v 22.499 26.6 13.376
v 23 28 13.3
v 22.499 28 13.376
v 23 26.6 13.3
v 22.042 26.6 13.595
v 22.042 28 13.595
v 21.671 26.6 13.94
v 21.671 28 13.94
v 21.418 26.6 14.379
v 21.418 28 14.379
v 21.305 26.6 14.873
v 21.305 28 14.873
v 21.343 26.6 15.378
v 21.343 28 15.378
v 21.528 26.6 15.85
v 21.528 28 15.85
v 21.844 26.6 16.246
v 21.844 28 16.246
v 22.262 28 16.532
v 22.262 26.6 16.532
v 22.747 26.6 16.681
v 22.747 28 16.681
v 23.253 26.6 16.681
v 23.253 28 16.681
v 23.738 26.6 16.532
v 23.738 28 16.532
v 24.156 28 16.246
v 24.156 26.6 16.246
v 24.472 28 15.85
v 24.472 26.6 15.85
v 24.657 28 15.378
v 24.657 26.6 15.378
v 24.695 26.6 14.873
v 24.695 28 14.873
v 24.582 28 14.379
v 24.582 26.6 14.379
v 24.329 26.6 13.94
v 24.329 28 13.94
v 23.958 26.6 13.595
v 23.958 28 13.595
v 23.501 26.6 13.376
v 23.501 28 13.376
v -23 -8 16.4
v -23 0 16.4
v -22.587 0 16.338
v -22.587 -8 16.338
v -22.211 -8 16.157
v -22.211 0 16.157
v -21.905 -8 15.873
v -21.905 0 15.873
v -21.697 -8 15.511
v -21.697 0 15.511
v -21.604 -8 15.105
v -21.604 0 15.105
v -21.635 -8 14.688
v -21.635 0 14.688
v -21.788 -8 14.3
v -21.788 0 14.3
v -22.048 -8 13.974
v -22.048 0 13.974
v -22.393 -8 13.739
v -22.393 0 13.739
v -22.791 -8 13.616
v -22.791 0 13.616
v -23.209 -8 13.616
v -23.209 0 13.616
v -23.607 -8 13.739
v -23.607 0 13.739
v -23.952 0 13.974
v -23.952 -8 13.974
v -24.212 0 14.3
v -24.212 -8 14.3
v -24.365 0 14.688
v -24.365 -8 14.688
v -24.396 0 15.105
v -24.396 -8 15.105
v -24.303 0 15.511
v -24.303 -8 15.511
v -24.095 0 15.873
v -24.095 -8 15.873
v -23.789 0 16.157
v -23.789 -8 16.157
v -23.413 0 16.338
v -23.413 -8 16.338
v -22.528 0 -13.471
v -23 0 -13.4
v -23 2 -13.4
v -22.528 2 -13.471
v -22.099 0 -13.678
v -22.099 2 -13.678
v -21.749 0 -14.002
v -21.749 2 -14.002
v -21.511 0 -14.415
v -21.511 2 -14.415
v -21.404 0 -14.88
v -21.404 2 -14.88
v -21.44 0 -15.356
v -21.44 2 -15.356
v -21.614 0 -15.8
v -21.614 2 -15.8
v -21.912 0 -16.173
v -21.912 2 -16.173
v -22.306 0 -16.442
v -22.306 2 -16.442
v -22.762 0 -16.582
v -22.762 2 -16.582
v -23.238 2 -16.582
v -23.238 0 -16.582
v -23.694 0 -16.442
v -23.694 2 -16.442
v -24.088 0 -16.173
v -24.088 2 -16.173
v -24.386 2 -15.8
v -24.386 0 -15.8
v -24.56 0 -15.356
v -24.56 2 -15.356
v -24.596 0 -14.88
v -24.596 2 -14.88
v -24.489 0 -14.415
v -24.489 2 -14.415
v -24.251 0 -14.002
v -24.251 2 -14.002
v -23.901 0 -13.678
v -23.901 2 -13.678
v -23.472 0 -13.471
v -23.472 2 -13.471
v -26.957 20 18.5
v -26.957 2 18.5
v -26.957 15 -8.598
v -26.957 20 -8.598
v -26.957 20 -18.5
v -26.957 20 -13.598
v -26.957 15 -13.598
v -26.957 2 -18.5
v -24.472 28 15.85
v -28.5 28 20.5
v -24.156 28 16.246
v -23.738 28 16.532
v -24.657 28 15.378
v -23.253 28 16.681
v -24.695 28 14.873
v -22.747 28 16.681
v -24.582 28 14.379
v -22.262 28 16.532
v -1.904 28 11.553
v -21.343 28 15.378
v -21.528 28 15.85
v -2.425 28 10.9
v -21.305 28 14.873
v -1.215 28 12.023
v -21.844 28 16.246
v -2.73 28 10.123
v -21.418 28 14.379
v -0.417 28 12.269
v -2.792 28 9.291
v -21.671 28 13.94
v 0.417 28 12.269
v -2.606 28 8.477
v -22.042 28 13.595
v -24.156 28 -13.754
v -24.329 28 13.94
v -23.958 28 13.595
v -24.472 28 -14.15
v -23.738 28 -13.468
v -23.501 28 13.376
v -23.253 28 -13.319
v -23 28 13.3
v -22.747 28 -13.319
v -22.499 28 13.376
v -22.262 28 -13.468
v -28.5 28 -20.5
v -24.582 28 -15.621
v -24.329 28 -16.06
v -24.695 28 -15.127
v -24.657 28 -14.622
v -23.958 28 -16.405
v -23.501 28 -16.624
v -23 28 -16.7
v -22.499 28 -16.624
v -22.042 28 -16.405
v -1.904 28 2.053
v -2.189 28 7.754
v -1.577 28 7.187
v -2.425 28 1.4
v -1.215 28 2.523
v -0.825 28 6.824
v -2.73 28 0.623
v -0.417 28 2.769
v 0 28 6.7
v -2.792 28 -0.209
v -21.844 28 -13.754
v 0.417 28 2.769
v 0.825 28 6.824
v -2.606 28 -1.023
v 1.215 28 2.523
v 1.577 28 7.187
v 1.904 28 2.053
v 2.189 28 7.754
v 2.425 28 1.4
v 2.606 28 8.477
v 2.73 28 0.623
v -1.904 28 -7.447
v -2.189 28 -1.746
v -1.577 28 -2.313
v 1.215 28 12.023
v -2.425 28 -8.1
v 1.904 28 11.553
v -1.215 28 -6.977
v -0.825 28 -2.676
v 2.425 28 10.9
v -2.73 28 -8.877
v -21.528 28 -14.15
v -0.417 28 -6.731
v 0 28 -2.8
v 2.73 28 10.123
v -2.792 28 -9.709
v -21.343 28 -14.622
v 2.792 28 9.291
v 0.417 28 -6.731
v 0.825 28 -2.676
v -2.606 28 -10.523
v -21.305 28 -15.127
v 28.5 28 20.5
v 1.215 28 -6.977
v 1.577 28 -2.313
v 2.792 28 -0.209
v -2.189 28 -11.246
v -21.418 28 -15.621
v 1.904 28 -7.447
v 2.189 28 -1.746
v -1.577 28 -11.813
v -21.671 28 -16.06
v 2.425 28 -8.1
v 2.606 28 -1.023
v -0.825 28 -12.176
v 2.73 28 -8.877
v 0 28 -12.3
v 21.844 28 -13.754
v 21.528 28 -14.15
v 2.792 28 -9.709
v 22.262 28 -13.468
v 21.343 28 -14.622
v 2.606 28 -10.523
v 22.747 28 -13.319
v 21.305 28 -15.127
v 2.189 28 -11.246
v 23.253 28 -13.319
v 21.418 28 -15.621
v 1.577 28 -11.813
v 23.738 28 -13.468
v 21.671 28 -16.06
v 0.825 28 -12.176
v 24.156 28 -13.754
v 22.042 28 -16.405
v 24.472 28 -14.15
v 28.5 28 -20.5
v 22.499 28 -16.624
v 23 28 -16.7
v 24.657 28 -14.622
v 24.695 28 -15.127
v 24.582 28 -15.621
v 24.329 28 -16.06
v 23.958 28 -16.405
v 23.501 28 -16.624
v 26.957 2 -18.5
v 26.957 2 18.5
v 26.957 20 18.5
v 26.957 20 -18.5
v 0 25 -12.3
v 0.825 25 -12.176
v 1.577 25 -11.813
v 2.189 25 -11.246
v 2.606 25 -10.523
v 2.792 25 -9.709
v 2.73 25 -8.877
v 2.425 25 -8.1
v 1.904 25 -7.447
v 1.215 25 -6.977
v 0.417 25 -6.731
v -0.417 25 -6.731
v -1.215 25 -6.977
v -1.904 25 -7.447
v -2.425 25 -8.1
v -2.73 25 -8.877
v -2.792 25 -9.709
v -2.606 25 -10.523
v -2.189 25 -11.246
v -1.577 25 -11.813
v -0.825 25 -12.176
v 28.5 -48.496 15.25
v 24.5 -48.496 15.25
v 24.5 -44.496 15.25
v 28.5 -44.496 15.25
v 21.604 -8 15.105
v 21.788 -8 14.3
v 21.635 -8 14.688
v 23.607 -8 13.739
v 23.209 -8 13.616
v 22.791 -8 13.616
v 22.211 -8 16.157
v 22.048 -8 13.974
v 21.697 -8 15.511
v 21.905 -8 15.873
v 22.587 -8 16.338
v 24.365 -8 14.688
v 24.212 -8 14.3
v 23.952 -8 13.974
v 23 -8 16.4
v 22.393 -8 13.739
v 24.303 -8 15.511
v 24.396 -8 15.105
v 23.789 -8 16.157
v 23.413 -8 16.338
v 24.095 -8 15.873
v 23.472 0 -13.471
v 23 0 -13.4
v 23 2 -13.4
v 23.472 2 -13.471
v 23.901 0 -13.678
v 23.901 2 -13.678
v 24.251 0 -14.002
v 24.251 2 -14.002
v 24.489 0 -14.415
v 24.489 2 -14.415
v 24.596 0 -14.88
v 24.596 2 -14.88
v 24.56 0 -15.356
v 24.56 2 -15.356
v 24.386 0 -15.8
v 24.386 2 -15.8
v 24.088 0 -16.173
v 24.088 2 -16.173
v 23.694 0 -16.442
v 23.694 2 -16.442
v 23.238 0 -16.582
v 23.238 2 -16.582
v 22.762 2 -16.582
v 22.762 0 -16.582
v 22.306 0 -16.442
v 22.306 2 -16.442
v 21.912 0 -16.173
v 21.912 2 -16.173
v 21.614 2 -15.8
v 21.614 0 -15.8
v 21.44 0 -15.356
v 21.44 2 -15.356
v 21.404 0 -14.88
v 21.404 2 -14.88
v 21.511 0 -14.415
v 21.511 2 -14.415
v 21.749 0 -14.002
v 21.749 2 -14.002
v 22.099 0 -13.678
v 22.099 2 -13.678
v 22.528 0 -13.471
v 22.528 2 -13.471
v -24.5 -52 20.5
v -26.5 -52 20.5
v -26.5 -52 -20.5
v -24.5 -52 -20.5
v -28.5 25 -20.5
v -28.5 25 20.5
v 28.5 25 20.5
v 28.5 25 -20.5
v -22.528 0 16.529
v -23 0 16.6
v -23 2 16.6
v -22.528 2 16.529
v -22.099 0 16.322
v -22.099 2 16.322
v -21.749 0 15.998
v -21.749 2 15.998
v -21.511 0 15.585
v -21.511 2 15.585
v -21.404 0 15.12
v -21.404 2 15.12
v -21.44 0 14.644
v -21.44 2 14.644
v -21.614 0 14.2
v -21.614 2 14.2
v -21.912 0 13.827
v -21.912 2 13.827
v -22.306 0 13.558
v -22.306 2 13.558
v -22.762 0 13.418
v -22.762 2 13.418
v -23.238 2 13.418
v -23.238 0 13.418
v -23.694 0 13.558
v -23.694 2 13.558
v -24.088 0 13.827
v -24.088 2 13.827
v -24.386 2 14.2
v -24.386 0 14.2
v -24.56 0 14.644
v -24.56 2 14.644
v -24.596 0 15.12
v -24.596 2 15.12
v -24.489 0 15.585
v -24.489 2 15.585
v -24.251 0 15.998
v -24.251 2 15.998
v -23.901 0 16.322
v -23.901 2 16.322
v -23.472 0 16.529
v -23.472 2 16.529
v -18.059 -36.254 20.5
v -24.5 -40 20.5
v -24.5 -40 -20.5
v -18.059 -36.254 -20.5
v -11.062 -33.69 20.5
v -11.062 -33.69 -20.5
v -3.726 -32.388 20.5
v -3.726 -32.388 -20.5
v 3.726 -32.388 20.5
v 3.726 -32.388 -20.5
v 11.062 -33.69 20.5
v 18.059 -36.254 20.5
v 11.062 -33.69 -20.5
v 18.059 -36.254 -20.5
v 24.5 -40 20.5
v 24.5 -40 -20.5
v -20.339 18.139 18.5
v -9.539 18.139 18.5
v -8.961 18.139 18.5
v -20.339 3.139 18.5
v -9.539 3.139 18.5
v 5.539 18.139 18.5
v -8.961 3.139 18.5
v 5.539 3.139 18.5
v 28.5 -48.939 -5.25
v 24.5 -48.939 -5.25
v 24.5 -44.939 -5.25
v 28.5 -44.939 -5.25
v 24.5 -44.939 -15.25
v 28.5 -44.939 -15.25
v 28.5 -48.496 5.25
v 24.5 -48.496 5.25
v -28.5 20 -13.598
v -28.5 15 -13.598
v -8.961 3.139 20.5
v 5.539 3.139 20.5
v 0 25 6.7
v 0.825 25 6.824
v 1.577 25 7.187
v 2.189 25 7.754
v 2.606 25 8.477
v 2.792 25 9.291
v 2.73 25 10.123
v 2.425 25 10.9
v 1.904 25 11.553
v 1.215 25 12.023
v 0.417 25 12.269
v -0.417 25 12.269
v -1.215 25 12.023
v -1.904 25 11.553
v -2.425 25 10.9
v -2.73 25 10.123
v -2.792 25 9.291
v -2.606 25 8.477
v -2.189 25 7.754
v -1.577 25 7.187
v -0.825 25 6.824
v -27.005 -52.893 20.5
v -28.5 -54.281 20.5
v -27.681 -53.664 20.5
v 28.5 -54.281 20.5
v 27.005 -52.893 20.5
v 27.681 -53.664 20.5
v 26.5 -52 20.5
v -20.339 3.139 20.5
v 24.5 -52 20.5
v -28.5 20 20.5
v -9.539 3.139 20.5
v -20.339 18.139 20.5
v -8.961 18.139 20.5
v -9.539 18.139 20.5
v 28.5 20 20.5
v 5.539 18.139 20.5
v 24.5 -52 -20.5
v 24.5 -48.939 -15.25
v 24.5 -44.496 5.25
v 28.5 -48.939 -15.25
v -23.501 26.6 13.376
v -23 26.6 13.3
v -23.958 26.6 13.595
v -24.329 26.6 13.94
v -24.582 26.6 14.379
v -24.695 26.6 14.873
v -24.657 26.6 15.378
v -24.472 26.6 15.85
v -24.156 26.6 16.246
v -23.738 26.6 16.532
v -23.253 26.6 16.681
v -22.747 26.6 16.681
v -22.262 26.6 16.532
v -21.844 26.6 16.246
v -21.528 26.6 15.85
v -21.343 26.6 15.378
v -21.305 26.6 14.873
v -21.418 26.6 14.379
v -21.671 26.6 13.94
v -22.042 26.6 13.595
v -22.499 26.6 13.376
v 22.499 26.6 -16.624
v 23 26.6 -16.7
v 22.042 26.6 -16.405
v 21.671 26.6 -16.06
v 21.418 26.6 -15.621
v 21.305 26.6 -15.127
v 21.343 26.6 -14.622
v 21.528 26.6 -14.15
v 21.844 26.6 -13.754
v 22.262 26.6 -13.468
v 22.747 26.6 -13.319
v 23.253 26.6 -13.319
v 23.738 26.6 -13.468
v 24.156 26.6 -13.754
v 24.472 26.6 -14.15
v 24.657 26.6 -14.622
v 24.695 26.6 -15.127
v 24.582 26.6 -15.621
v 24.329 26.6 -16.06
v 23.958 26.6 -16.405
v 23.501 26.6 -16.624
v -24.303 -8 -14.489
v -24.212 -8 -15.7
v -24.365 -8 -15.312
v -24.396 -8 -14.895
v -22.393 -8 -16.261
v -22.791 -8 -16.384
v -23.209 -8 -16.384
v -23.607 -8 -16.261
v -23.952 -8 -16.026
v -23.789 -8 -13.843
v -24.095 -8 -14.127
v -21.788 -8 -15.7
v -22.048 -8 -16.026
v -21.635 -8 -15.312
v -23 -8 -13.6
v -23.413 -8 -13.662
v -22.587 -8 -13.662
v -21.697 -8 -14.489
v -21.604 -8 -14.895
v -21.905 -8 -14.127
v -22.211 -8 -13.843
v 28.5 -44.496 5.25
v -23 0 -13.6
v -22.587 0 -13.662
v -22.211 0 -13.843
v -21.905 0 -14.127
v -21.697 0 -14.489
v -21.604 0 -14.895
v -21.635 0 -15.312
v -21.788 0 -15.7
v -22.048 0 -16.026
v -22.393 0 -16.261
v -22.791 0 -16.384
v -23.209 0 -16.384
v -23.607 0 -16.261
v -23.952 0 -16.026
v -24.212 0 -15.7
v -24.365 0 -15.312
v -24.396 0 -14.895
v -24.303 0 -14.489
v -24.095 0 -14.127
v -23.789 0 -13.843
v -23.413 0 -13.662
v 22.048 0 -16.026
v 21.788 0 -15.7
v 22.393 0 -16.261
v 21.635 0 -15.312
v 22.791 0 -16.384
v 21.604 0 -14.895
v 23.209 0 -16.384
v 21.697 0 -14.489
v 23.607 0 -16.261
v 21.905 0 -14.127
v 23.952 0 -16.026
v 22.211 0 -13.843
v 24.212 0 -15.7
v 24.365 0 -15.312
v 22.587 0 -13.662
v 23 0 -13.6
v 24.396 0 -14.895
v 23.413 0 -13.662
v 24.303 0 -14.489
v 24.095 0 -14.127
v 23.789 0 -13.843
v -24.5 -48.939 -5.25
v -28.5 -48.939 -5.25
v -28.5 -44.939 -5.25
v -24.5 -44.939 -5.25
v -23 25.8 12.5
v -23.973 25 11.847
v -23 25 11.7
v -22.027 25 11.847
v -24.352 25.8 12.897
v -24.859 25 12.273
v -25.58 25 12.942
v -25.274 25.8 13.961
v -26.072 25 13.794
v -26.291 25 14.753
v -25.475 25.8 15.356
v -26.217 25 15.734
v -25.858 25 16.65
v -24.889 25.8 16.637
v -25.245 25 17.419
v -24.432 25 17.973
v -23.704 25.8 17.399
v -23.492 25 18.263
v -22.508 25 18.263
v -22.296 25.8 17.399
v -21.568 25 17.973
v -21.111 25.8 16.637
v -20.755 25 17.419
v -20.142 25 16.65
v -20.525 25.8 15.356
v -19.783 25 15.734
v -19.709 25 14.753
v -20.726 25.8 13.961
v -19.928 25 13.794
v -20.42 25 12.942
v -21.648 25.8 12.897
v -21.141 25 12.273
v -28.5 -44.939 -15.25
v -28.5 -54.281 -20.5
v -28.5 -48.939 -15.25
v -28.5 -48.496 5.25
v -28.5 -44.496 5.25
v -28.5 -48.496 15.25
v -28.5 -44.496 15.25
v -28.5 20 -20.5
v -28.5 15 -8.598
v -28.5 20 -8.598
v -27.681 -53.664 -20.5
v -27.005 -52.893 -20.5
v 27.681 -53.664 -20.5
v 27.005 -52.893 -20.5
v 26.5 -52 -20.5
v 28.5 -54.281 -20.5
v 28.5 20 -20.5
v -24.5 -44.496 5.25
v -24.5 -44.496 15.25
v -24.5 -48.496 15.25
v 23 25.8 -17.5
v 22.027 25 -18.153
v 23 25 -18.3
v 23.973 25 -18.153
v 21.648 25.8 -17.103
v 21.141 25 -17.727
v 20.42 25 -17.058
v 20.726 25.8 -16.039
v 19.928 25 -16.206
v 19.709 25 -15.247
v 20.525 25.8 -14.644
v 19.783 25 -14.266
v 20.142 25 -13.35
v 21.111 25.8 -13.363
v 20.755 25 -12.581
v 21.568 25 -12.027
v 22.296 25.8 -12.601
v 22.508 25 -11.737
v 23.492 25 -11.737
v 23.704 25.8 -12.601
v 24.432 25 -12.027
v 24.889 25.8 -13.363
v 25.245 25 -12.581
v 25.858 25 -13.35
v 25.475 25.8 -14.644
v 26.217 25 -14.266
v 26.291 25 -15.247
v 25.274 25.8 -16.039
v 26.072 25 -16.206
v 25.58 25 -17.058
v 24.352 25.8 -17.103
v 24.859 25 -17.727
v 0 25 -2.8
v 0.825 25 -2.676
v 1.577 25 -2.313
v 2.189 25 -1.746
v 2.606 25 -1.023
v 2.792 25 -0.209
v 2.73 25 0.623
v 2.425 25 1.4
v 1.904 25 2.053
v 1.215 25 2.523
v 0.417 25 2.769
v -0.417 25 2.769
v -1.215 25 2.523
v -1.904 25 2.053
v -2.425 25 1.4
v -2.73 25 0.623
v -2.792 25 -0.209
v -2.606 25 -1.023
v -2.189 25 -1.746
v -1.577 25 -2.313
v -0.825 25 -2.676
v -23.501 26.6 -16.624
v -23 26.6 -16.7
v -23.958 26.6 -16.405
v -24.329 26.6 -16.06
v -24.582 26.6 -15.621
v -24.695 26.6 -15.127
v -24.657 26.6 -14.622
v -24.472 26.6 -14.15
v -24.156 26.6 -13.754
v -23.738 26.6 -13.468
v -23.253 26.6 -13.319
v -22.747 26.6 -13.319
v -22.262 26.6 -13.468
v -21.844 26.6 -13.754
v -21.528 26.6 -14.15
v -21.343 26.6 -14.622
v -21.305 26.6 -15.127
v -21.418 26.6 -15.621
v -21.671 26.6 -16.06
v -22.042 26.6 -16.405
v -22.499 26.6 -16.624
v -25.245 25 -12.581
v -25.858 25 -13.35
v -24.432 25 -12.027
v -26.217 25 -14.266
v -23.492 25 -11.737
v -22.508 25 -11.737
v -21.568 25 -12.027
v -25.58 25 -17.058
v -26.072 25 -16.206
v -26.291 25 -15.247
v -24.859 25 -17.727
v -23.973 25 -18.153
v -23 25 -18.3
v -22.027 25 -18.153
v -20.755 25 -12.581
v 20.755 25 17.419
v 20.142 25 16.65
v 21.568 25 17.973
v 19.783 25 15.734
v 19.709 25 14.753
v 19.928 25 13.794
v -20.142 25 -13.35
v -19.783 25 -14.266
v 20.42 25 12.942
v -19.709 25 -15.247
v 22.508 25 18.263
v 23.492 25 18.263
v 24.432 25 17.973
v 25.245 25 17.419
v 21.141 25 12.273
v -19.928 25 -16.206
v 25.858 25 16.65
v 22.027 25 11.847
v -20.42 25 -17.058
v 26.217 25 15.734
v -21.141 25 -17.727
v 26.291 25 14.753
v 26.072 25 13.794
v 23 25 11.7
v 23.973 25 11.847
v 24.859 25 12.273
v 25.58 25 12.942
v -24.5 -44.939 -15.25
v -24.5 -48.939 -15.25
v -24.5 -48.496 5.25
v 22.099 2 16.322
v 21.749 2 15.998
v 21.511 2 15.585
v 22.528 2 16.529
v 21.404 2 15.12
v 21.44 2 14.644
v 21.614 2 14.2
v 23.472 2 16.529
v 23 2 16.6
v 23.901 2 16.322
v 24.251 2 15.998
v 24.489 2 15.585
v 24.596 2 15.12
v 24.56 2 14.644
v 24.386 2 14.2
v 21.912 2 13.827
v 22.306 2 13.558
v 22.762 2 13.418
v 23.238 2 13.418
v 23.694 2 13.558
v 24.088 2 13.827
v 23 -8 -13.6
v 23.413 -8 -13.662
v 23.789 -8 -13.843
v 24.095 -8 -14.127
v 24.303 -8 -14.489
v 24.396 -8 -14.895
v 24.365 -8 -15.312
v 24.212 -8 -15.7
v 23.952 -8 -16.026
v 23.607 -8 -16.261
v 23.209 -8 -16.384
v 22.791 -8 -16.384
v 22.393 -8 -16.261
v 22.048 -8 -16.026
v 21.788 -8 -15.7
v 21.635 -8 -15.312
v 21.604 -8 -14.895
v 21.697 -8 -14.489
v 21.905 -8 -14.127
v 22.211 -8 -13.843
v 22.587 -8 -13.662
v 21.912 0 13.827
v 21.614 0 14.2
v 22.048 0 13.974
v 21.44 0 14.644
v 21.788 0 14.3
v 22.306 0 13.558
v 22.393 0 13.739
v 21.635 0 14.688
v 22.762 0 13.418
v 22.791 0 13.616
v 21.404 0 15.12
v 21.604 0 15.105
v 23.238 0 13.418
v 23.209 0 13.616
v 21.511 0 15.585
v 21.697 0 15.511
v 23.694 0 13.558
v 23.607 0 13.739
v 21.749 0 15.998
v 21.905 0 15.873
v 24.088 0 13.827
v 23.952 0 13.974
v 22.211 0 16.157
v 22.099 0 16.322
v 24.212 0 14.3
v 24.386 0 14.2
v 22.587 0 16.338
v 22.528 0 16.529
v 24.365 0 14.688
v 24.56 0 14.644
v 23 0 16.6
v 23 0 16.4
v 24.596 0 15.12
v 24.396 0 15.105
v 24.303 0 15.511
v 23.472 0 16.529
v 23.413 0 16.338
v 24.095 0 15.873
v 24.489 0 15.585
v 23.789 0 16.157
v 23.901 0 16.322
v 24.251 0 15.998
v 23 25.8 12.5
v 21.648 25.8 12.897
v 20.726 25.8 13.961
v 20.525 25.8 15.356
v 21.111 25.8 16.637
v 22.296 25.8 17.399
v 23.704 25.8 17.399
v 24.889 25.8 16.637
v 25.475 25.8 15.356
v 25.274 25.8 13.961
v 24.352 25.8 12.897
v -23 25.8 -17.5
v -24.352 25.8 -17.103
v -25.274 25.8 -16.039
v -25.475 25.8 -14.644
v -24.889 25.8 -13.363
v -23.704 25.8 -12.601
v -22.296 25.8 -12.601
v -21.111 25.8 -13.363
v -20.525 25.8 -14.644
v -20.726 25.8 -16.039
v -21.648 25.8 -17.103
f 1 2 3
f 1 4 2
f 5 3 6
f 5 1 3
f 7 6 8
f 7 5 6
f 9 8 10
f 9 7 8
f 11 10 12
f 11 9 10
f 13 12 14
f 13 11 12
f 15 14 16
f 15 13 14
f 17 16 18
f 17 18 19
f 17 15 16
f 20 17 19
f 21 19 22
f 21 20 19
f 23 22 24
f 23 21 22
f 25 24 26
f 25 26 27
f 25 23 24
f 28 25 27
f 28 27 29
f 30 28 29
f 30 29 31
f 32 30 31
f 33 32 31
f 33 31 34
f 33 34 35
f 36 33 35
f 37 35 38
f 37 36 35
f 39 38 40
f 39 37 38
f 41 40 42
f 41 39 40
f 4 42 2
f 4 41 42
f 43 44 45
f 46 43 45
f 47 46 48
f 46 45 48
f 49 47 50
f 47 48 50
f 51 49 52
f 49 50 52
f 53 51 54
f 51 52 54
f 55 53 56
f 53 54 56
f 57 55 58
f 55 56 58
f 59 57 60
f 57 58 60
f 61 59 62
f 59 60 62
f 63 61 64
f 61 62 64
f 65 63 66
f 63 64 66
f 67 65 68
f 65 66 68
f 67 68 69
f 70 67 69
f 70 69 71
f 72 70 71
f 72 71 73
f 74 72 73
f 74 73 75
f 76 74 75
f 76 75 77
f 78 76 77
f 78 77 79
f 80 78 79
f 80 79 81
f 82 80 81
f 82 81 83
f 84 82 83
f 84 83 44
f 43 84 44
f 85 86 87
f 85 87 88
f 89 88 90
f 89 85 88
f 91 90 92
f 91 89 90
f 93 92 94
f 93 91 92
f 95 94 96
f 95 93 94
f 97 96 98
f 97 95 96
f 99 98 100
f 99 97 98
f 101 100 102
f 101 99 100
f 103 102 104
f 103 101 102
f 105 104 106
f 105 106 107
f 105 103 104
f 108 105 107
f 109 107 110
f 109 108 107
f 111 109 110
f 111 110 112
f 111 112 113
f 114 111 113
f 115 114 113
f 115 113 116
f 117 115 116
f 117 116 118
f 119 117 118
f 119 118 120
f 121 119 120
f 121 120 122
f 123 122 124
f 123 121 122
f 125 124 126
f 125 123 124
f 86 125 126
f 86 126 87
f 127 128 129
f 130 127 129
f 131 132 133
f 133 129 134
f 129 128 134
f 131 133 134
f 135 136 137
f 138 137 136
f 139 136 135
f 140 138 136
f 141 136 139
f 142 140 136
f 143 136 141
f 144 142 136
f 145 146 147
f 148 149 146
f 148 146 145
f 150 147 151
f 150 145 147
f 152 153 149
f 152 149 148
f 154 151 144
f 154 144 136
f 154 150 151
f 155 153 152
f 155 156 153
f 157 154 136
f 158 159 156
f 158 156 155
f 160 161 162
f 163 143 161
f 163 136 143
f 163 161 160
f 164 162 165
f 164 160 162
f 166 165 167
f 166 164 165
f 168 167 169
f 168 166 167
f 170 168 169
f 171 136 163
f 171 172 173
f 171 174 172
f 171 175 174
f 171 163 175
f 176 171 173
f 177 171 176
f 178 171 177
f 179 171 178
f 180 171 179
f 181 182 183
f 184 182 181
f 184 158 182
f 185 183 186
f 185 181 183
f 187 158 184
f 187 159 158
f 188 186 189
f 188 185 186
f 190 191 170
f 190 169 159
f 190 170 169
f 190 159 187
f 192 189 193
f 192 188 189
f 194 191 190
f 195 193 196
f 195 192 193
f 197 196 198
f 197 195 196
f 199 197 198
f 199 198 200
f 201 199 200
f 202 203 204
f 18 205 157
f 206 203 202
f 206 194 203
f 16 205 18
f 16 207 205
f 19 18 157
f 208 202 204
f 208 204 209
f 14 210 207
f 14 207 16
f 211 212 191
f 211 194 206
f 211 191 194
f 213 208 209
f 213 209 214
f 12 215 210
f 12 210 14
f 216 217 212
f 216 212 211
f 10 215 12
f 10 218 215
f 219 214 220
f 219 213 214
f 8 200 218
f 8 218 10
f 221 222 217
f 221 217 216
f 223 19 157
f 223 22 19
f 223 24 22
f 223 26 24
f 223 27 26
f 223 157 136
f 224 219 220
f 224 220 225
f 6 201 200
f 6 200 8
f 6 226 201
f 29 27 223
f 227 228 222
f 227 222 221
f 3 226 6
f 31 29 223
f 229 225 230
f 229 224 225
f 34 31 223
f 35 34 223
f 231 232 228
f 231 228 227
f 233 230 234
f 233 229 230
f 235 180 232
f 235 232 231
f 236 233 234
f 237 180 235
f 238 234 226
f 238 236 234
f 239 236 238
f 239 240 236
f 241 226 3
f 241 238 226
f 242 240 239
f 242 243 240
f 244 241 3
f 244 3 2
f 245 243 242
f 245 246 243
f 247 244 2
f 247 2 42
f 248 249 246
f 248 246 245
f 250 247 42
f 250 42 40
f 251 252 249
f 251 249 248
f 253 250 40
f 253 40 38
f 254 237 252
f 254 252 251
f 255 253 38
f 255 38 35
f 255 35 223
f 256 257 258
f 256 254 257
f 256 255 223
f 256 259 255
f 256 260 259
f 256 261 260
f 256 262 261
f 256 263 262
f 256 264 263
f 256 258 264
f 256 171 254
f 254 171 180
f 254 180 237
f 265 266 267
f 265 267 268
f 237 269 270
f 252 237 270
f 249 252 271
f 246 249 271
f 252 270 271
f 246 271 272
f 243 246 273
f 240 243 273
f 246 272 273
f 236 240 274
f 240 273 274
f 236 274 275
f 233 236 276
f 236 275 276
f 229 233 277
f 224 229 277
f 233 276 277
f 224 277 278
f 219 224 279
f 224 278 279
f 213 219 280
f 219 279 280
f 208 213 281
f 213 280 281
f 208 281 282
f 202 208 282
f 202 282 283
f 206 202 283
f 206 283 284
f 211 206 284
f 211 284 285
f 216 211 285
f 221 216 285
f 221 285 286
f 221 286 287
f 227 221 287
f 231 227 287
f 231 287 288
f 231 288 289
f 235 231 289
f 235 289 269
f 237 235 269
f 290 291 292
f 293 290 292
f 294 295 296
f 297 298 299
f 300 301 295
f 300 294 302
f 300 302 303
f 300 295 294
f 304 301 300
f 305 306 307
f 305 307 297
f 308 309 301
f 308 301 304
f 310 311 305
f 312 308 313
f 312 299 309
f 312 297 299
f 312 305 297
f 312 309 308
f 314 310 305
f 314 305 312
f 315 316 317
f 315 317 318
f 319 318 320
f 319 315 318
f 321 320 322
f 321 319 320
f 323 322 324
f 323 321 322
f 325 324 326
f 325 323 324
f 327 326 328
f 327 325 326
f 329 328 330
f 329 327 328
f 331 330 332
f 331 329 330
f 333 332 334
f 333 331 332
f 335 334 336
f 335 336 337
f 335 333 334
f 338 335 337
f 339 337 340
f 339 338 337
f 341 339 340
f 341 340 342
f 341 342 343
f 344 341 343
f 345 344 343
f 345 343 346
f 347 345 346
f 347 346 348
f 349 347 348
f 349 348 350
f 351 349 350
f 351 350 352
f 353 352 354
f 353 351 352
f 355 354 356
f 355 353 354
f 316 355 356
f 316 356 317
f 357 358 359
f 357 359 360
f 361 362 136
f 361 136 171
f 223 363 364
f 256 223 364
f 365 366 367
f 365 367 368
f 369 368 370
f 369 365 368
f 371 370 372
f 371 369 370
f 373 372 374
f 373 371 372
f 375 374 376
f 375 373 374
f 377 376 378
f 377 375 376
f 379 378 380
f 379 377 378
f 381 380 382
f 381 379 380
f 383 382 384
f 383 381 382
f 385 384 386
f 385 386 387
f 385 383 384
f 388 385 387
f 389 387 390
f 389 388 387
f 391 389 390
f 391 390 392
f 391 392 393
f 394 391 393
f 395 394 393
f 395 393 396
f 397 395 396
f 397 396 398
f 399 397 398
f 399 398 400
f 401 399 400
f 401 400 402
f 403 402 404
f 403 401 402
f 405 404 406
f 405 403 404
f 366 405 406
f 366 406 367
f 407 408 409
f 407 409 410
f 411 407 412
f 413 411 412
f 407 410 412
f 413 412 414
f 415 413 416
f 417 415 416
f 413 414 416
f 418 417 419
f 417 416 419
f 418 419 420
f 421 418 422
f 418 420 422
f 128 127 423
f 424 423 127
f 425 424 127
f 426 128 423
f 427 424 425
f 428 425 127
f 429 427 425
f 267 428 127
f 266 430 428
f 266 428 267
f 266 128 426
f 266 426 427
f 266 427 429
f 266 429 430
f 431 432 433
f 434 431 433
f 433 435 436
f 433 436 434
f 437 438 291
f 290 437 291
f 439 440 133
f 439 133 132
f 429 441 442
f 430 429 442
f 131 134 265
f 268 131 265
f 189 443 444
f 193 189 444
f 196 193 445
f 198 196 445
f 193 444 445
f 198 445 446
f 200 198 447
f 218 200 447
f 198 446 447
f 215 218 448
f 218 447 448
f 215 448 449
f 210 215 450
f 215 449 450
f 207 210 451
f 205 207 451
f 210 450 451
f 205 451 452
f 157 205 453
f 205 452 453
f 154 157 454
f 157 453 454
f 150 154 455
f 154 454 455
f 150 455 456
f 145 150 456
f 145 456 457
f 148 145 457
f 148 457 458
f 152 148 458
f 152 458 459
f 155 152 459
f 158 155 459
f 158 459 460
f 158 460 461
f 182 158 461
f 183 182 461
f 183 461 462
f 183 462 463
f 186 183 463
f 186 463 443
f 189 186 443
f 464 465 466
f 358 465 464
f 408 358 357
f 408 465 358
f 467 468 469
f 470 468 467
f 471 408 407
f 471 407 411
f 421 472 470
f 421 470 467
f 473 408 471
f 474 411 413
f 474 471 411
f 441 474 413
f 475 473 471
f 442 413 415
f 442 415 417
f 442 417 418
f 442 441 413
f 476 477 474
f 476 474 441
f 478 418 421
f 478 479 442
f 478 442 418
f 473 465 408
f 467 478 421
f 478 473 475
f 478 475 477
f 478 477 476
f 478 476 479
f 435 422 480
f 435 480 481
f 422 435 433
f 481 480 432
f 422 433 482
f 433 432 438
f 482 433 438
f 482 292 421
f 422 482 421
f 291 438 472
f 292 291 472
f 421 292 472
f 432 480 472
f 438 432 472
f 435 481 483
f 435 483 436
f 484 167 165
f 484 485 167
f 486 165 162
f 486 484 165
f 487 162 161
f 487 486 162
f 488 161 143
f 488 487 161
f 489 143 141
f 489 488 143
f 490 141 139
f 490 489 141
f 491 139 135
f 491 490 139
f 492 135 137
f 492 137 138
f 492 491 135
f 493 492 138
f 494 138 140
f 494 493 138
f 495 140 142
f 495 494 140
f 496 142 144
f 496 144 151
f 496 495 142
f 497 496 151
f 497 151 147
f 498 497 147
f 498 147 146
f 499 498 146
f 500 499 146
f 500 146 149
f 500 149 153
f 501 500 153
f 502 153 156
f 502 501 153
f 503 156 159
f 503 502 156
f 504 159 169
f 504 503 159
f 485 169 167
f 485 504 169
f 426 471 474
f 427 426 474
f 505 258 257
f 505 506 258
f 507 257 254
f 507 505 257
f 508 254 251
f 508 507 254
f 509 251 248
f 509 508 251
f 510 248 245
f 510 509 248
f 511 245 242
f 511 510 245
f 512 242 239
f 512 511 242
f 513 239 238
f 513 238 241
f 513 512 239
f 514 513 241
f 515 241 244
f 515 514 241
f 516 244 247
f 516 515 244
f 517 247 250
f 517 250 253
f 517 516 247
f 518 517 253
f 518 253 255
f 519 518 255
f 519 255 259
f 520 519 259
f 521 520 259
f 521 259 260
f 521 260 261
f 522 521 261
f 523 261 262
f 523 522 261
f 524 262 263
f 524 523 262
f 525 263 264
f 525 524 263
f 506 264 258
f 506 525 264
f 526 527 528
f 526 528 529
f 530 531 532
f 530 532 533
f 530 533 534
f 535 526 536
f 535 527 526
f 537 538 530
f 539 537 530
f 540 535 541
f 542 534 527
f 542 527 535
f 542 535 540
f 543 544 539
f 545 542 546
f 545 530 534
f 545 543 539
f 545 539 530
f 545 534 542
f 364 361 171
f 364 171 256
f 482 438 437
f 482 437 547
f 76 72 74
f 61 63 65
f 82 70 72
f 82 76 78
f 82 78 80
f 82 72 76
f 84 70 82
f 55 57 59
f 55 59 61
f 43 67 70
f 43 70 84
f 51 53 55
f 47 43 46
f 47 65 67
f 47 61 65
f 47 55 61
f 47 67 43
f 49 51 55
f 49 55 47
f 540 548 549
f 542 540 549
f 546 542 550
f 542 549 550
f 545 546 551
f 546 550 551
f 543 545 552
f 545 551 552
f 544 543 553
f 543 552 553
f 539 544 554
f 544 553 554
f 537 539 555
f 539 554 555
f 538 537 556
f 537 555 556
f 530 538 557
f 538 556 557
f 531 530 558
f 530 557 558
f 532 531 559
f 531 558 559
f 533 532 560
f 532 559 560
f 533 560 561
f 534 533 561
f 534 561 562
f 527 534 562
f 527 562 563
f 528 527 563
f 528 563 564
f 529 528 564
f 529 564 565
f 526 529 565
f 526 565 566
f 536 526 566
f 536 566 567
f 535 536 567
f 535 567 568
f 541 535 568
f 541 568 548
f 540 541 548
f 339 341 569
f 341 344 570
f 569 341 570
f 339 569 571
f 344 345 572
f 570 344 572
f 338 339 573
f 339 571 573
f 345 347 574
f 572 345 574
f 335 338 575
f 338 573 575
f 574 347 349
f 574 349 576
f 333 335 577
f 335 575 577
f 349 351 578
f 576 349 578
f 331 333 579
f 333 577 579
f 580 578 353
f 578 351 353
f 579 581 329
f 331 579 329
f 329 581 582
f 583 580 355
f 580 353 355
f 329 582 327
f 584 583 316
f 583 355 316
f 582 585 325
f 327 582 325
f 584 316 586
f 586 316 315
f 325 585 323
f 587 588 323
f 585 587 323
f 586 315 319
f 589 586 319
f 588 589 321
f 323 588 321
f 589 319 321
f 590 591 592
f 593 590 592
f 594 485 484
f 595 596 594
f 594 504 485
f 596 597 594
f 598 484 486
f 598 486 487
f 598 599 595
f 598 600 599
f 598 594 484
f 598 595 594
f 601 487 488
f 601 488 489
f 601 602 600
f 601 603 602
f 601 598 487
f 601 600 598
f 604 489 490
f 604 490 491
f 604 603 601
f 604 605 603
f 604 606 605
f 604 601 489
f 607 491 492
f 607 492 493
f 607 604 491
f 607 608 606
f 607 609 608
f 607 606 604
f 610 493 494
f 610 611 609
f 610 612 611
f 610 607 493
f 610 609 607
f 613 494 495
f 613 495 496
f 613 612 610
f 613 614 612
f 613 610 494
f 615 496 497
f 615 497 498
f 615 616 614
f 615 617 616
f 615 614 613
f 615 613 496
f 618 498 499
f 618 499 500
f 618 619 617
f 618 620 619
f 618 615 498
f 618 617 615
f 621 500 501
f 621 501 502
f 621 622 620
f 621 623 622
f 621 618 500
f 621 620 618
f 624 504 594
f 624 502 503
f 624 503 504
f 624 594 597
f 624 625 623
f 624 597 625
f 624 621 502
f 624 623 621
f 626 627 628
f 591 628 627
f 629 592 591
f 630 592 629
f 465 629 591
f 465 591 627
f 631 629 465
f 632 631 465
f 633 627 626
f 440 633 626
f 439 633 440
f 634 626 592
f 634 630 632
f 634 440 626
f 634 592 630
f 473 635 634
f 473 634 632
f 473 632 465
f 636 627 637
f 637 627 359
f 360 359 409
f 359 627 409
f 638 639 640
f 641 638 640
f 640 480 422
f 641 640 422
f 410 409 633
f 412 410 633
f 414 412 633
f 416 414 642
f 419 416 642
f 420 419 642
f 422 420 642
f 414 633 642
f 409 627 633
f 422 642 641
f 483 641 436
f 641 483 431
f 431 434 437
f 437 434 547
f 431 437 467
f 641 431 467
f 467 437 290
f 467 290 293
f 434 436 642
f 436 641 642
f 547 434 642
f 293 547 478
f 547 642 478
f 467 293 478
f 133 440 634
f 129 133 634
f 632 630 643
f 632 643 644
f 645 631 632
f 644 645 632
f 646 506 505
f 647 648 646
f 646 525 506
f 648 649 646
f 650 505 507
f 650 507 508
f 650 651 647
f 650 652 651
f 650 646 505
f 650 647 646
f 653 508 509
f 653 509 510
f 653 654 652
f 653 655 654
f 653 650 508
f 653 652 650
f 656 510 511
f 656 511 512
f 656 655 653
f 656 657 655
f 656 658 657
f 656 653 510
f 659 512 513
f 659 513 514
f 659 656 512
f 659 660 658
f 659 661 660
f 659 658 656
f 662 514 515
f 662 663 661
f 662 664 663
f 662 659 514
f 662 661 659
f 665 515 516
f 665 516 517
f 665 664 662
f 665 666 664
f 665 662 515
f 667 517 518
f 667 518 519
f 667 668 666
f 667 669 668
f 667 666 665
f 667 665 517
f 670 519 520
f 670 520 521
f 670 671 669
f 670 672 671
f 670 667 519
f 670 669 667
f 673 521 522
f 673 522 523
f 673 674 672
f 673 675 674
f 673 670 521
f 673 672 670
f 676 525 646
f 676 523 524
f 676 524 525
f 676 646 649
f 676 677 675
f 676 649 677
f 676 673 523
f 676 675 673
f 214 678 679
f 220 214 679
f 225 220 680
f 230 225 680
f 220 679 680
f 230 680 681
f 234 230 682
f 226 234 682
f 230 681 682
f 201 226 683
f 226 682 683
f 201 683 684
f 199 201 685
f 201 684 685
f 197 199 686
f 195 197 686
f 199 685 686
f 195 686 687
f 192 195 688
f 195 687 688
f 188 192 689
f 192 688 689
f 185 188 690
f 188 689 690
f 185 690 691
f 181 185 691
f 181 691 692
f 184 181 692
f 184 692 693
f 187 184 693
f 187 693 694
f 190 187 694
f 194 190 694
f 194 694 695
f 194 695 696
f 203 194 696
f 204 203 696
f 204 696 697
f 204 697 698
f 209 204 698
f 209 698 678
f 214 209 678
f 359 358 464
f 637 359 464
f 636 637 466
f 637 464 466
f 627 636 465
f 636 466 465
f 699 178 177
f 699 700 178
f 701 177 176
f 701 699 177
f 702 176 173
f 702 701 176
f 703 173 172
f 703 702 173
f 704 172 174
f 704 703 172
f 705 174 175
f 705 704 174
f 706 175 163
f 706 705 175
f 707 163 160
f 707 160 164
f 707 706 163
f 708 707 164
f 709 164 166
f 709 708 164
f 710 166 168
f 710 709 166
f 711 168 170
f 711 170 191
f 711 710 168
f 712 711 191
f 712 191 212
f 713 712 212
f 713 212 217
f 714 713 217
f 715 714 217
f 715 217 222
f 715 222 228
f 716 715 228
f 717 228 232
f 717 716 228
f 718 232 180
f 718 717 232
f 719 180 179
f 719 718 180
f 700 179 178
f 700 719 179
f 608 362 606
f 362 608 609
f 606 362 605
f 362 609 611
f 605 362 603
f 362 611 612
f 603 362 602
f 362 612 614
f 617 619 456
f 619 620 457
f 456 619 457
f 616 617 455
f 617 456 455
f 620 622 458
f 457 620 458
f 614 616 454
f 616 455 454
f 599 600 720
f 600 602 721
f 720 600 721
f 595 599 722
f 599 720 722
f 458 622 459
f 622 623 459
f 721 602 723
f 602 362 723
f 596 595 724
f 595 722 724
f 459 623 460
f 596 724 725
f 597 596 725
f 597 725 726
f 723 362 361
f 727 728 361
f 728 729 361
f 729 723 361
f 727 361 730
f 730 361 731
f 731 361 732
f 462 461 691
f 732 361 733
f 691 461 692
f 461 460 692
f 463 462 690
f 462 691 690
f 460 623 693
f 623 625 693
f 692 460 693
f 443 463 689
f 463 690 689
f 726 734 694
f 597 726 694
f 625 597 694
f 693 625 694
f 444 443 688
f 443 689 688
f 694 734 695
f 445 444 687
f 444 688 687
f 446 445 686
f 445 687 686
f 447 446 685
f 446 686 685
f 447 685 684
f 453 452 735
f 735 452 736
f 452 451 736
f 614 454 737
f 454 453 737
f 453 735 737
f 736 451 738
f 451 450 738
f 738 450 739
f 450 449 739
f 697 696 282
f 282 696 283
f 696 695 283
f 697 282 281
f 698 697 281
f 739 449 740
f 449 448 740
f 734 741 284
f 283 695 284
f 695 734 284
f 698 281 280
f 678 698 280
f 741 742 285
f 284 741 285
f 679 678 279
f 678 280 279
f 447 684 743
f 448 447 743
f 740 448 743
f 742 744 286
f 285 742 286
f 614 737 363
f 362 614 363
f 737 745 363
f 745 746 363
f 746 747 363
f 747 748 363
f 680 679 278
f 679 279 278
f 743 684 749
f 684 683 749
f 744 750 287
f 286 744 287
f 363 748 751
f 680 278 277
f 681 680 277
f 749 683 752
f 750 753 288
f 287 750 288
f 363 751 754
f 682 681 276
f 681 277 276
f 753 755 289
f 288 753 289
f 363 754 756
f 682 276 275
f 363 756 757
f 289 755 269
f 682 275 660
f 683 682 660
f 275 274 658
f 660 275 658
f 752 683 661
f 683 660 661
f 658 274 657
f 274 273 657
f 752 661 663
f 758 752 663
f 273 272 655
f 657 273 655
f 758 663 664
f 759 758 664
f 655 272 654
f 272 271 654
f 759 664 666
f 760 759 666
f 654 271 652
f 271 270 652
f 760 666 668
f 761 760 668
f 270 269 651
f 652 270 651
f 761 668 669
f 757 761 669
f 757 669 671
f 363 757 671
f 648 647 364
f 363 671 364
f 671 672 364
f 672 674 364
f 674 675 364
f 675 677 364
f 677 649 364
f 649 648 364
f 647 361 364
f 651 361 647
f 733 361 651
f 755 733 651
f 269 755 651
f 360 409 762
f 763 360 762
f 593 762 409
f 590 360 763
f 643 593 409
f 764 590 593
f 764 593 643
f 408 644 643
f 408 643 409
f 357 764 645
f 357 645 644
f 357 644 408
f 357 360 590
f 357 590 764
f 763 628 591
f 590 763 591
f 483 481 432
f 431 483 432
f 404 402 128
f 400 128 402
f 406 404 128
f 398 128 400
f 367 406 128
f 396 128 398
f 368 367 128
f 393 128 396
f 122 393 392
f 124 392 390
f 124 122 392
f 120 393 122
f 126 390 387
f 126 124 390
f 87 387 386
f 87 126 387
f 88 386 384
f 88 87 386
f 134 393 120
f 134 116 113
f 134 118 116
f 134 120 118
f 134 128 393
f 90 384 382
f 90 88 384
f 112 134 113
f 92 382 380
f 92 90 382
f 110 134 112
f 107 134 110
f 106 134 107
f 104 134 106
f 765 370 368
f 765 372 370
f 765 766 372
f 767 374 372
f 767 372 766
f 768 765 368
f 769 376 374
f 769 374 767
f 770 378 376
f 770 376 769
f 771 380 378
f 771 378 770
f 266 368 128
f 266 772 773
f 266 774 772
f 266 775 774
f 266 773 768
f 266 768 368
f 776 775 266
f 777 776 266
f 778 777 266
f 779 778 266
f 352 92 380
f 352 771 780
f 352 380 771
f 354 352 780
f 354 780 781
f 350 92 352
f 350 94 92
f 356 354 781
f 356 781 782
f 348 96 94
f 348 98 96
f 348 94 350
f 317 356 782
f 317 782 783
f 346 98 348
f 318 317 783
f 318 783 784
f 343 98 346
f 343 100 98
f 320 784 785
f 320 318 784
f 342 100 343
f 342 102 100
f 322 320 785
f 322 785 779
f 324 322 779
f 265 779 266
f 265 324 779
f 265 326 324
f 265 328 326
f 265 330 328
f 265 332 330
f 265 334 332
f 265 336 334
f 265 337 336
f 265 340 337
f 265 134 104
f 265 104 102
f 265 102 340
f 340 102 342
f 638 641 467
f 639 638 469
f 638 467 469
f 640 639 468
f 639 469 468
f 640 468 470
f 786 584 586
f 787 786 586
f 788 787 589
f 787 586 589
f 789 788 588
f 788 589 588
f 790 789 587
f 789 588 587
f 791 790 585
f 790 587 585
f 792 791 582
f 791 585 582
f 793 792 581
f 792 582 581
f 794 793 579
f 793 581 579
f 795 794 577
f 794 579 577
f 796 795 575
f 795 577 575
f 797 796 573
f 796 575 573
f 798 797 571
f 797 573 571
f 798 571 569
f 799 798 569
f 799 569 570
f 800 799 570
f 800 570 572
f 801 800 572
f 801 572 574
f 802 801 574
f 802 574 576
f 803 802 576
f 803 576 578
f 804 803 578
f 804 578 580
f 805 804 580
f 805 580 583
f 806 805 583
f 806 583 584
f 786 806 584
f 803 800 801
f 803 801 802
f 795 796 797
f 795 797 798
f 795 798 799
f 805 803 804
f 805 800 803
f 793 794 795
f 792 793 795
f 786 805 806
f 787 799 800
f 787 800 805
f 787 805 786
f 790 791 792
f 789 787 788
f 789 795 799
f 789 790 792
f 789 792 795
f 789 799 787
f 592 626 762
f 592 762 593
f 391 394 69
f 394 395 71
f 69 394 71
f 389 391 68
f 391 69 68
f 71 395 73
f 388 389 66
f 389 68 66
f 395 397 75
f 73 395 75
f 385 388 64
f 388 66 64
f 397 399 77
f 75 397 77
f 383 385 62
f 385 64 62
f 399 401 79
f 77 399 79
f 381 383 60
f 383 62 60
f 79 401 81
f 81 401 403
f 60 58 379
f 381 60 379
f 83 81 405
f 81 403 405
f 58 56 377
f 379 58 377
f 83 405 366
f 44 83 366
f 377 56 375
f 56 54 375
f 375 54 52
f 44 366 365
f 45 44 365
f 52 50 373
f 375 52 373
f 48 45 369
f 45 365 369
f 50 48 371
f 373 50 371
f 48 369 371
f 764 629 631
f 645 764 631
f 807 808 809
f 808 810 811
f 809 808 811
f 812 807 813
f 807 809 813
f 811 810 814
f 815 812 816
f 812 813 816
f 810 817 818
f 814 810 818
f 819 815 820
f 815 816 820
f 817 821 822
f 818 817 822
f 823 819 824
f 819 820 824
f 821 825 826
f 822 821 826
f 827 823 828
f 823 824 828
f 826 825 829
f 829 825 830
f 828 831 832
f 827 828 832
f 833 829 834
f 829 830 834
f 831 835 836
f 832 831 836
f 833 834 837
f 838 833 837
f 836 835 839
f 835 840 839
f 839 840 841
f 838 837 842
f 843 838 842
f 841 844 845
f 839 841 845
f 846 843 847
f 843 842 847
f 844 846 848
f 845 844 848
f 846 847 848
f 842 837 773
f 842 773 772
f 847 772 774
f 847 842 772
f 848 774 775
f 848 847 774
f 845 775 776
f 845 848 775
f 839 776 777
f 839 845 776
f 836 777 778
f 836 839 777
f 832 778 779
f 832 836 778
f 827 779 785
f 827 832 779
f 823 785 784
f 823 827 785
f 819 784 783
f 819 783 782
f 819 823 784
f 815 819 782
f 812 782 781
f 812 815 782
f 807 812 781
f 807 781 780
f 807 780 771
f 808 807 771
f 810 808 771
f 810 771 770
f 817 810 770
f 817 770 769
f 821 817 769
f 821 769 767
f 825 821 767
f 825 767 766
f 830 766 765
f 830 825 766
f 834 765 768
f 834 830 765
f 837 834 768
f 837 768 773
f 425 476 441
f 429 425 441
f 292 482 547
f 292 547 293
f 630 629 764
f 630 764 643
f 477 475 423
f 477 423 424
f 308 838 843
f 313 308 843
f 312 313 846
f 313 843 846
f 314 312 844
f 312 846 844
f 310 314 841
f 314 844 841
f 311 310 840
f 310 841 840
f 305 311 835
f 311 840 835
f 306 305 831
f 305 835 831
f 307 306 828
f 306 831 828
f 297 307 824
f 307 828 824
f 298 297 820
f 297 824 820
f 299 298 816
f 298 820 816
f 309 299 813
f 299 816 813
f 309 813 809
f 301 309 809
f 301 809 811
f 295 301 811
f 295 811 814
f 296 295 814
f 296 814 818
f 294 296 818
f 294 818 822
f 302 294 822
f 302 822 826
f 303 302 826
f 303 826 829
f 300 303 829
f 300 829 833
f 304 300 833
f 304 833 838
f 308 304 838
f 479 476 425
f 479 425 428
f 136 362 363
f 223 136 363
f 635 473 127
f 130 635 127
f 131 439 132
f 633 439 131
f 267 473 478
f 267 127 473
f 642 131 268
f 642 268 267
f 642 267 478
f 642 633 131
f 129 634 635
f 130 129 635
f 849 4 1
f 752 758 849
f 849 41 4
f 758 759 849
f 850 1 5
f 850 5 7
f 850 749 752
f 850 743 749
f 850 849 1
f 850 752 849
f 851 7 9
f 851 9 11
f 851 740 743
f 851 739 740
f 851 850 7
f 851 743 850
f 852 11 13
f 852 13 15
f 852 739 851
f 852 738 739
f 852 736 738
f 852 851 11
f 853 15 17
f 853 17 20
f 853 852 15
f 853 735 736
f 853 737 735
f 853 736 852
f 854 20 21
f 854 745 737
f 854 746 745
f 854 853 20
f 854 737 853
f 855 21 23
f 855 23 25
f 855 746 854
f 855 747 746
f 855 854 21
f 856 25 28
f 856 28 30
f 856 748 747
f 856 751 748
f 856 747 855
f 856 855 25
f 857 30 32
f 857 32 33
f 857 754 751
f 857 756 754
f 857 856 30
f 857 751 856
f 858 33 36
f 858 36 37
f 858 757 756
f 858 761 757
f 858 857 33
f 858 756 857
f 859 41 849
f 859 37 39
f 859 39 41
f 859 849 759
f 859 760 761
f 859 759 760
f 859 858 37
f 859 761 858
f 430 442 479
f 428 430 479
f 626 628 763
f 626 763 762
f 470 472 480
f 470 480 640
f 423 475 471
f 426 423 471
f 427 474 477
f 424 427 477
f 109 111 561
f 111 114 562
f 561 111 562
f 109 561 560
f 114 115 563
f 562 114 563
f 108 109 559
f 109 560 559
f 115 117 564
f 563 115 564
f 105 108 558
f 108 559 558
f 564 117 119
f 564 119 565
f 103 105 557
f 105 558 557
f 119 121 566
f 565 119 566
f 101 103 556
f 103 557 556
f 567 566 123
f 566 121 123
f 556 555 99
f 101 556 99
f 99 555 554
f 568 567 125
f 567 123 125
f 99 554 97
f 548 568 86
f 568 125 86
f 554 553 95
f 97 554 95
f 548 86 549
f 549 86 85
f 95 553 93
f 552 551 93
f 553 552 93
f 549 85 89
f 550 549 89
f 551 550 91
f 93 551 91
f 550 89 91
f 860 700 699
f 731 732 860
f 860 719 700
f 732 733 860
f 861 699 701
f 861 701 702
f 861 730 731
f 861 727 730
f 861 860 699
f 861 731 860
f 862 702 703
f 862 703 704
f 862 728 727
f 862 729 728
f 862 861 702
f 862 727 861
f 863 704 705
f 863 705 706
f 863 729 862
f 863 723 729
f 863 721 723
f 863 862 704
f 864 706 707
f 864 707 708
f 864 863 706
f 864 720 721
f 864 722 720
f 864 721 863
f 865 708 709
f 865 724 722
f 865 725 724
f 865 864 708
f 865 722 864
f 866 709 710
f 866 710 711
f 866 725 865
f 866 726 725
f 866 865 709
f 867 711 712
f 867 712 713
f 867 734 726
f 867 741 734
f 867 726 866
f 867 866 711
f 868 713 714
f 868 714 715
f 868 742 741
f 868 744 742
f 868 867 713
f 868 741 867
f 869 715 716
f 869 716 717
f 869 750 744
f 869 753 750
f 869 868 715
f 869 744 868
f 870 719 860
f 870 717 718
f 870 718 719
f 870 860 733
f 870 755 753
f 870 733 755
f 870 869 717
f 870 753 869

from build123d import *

# Parameters (mm, degrees)
SKETCH_2_W                  = 57
SKETCH_2_H                  = 41
EXTRUDE_1_DEPTH             = 2
SKETCH_1_R                  = 1.6
CUT_EXTRUDE_1_DEPTH         = 2
SKETCH_4_W                  = 57
SKETCH_4_H                  = 41
SKETCH_4_W_2                = 53.914285714
SKETCH_4_H_2                = 37
EXTRUDE_2_DEPTH             = 20
SKETCH_5_W                  = 10.8
SKETCH_5_H                  = 13
SKETCH_5_H_2                = 2
SKETCH_5_W_2                = 14.5
CUT_EXTRUDE_2_DEPTH         = 18.5
EXTRUDE_START               = 25
SKETCH_6_W                  = 57
SKETCH_6_H                  = 41
EXTRUDE_3_DEPTH             = 3
CUT_EXTRUDE_START           = 23
SKETCH_1_2_R                = 1.6
CUT_EXTRUDE_4_DEPTH         = 5
SKETCH_7_R                  = 2.8
CUT_EXTRUDE_5_DEPTH         = 4
SKETCH_8_W                  = 5
SKETCH_8_H                  = 5
CUT_EXTRUDE_6_DEPTH         = 10
SKETCH_9_W                  = 57
SKETCH_9_H                  = 41
EXTRUDE_4_DEPTH             = 40
SKETCH_10_R                 = 1.4
CUT_EXTRUDE_7_DEPTH         = 10
SKETCH_12_W                 = 8
SKETCH_12_H                 = 41
EXTRUDE_5_DEPTH             = 15
SKETCH_13_W                 = 4
SKETCH_13_H                 = 41
CUT_EXTRUDE_8_DEPTH         = 15
SKETCH_14_W                 = 2
SKETCH_14_H                 = 41
CUT_EXTRUDE_9_DEPTH         = 3
SKETCH_15_W                 = 10
SKETCH_15_H                 = 4
CUT_EXTRUDE_10_DEPTH        = 82.818396464
CUT_EXTRUDE_12_DEPTH        = 75.284924446
HOLE_WIZARD_M3_1_AT_2_COUNT = 2
HOLE_WIZARD_M3_1_AT_2_PITCH = 30
HOLE_WIZARD_M3_1_AT_3_COUNT = 2
HOLE_WIZARD_M3_1_AT_3_PITCH = 54.918120871
HOLE_WIZARD_M3_1_AT_4_COUNT = 2
HOLE_WIZARD_M3_1_AT_4_PITCH = 46
FILLET_1_R                  = 5


with BuildPart() as part:
    # 草图2 → 凸台-拉伸1 (new body)
    with BuildSketch(Plane(origin=(0, 0, 0), x_dir=(1, 0, 0), z_dir=(0, 1, 0))):
        Rectangle(SKETCH_2_W, SKETCH_2_H)
    extrude(amount=EXTRUDE_1_DEPTH)

    # 草图1 → 切除-拉伸1 (cut)
    with BuildSketch(Plane(origin=(0, 0, 0), x_dir=(1, 0, 0), z_dir=(0, 1, 0))):
        with Locations(Location((-23, 15, 0), (0, 0, 270))):
            Circle(SKETCH_1_R)
        with Locations(Location((-23, -15, 0), (0, 0, 270))):
            Circle(SKETCH_1_R)
        with Locations(Location((23, -15, 0), (0, 0, 270))):
            Circle(SKETCH_1_R)
        with Locations(Location((23, 15, 0), (0, 0, 270))):
            Circle(SKETCH_1_R)
    extrude(amount=CUT_EXTRUDE_1_DEPTH, mode=Mode.SUBTRACT)

    # 草图4 → 凸台-拉伸2 (add)
    with BuildSketch(Plane(origin=(0, 0, 0), x_dir=(1, 0, 0), z_dir=(0, 1, 0))):
        Rectangle(SKETCH_4_W, SKETCH_4_H)
        Rectangle(SKETCH_4_W_2, SKETCH_4_H_2, mode=Mode.SUBTRACT)
    extrude(amount=EXTRUDE_2_DEPTH)

    # 草图5 → 切除-拉伸2 (cut)
    with BuildSketch(Plane.XY.offset(20.5)):
        with Locations((-14.939380763, 9.639146882)):
            Rectangle(SKETCH_5_W, SKETCH_5_H)
        with Locations((-14.939380763, 17.139146882)):
            Rectangle(SKETCH_5_W, SKETCH_5_H_2)
        with Locations((-1.710619237, 9.639146882)):
            Rectangle(SKETCH_5_W_2, SKETCH_5_H)
        with Locations((-1.710619237, 17.139146882)):
            Rectangle(SKETCH_5_W_2, SKETCH_5_H_2)
    extrude(amount=-CUT_EXTRUDE_2_DEPTH, mode=Mode.SUBTRACT)

    # 草图8 → 切除-拉伸6 (cut)
    with BuildSketch(Plane.ZY.offset(28.5)):
        with Locations((-11.098227415, 17.5)):
            Rectangle(SKETCH_8_W, SKETCH_8_H)
    extrude(amount=-CUT_EXTRUDE_6_DEPTH, mode=Mode.SUBTRACT)

    # 草图9 → 凸台-拉伸4 (add)
    with BuildSketch(Plane.XZ):
        Rectangle(SKETCH_9_W, SKETCH_9_H)
    extrude(amount=EXTRUDE_4_DEPTH)

    # 草图10 → 切除-拉伸7 (cut)
    with BuildSketch(Plane(origin=(0, 2, 0), x_dir=(1, 0, 0), z_dir=(0, 1, 0))):
        with Locations(Location((-23, 15, 0), (0, 0, 270))):
            Circle(SKETCH_10_R)
        with Locations(Location((-23, -15, 0), (0, 0, 270))):
            Circle(SKETCH_10_R)
        with Locations(Location((23, -15, 0), (0, 0, 270))):
            Circle(SKETCH_10_R)
        with Locations(Location((23, 15, 0), (0, 0, 270))):
            Circle(SKETCH_10_R)
    extrude(amount=-CUT_EXTRUDE_7_DEPTH, mode=Mode.SUBTRACT)

    # 草图12 → 凸台-拉伸5 (add)
    with BuildSketch(Plane.XZ.offset(40)):
        with Locations((-24.5, 0)):
            Rectangle(SKETCH_12_W, SKETCH_12_H)
        with Locations((24.5, 0)):
            Rectangle(SKETCH_12_W, SKETCH_12_H)
    extrude(amount=EXTRUDE_5_DEPTH)

    # 草图13 → 切除-拉伸8 (cut)
    with BuildSketch(Plane.XZ.offset(55)):
        with Locations((-22.5, 0)):
            Rectangle(SKETCH_13_W, SKETCH_13_H)
        with Locations((22.5, 0)):
            Rectangle(SKETCH_13_W, SKETCH_13_H)
    extrude(amount=-CUT_EXTRUDE_8_DEPTH, mode=Mode.SUBTRACT)

    # 草图14 → 切除-拉伸9 (cut)
    with BuildSketch(Plane.XZ.offset(55)):
        with Locations((-25.5, 0)):
            Rectangle(SKETCH_14_W, SKETCH_14_H)
        with Locations((25.5, 0)):
            Rectangle(SKETCH_14_W, SKETCH_14_H)
    extrude(amount=-CUT_EXTRUDE_9_DEPTH, mode=Mode.SUBTRACT)

    # 草图15 → 切除-拉伸10 (cut, through all)
    with BuildSketch(Plane.ZY.offset(28.5)):
        with Locations((-10.25, -46.939346002)):
            Rectangle(SKETCH_15_W, SKETCH_15_H)
        with Locations((10.25, -46.496240266)):
            Rectangle(SKETCH_15_W, SKETCH_15_H)
    extrude(amount=-CUT_EXTRUDE_10_DEPTH, mode=Mode.SUBTRACT)

    # 草图19 → 切除-拉伸12 (cut, through all)
    with BuildSketch(Plane(origin=(0, 0, -20.5), x_dir=(-1, 0, 0), z_dir=(0, 0, -1))):
        with BuildLine():
            ThreePointArc((24.5, -40), (0, -32.224551533), (-24.5, -40))
            Line((-24.5, -40), (24.5, -40))
        make_face()
    extrude(amount=-CUT_EXTRUDE_12_DEPTH, mode=Mode.SUBTRACT)

    # 圆角1
    # the kernel refuses this fillet: 5 mm, written as the material it takes off along each edge
    with BuildSketch(Plane(origin=(26.5, -55, 31.956439237), x_dir=(0, 1, 0), z_dir=(0, 0, -1))) as fillet_1_piece_1:
        with BuildLine():
            CenterArc((5, 4.582575695), FILLET_1_R, 180, 66.421821522)
            Line((0, 4.582575695), (-0.1, 4.582575695))
            Line((-0.1, 4.582575695), (-0.1, 0))
            Line((-0.1, 0), (0, -0.1))
            ThreePointArc((0, -0.1), (1.5, -0.1), (2.96, -0.091651514))
            Line((2.96, -0.091651514), (3, 0))
        make_face()
    extrude(amount=63.912878475, mode=Mode.SUBTRACT)
    with BuildSketch(Plane(origin=(-26.5, -55, 31.956439237), x_dir=(0, 1, 0), z_dir=(0, 0, -1))) as fillet_1_piece_2:
        with BuildLine():
            CenterArc((5, -4.582575695), FILLET_1_R, 113.578178478, 66.421821522)
            Line((0, -4.582575695), (-0.1, -4.582575695))
            Line((-0.1, -4.582575695), (-0.1, 0))
            Line((-0.1, 0), (0, 0.1))
            ThreePointArc((0, 0.1), (1.5, 0.1), (2.96, 0.091651514))
            Line((2.96, 0.091651514), (3, 0))
        make_face()
    extrude(amount=63.912878475, mode=Mode.SUBTRACT)


with BuildPart() as body_2:
    # 草图6 → 凸台-拉伸3 (new body)
    with BuildSketch(Plane(origin=(0, 0, 0), x_dir=(1, 0, 0), z_dir=(0, 1, 0)).offset(EXTRUDE_START)):
        Rectangle(SKETCH_6_W, SKETCH_6_H)
    extrude(amount=EXTRUDE_3_DEPTH)

    # 草图1<2> → 切除-拉伸4 (cut)
    with BuildSketch(Plane(origin=(0, 0, 0), x_dir=(1, 0, 0), z_dir=(0, 1, 0)).offset(CUT_EXTRUDE_START)):
        with Locations(Location((-23, 15, 0), (0, 0, 270))):
            Circle(SKETCH_1_2_R)
        with Locations(Location((-23, -15, 0), (0, 0, 270))):
            Circle(SKETCH_1_2_R)
        with Locations(Location((23, -15, 0), (0, 0, 270))):
            Circle(SKETCH_1_2_R)
        with Locations(Location((23, 15, 0), (0, 0, 270))):
            Circle(SKETCH_1_2_R)
    extrude(amount=CUT_EXTRUDE_4_DEPTH, mode=Mode.SUBTRACT)

    # 草图7 → 切除-拉伸5 (cut)
    with BuildSketch(Plane.XZ.offset(-25)):
        with Locations(Location((0, 0, 0), (0, 0, 270))):
            Circle(SKETCH_7_R)
        with Locations(Location((0, -9.5, 0), (0, 0, 270))):
            Circle(SKETCH_7_R)
        with Locations(Location((0, 9.5, 0), (0, 0, 270))):
            Circle(SKETCH_7_R)
    extrude(amount=-CUT_EXTRUDE_5_DEPTH, mode=Mode.SUBTRACT)

    # 草图21 → M3 十字槽沉头木螺钉的锥形沉头孔1 (revolve, cut)
    with BuildSketch(Plane(origin=(-23, 25, 15), x_dir=(0, 0, -1), z_dir=(1, 0, 0))):
        Polygon((0, 0), (0, 3), (1.7, 3), (1.7, 1.6), (3.3, 0), align=None)
    hole_wizard_m3_1 = revolve(axis=Axis((-23, 18.65, 15), (0, 1, 0)), mode=Mode.SUBTRACT)

    # M3 十字槽沉头木螺钉的锥形沉头孔1 at 2: M3 十字槽沉头木螺钉的锥形沉头孔1 ×2
    with Locations(*[(0, 0, -i * HOLE_WIZARD_M3_1_AT_2_PITCH) for i in range(1, HOLE_WIZARD_M3_1_AT_2_COUNT)]):
        add(hole_wizard_m3_1, mode=Mode.SUBTRACT)

    # M3 十字槽沉头木螺钉的锥形沉头孔1 at 3: M3 十字槽沉头木螺钉的锥形沉头孔1 ×2
    with Locations(*[Vector(0.8376105968386142, 0, -0.5462677805469224) * (i * HOLE_WIZARD_M3_1_AT_3_PITCH) for i in range(1, HOLE_WIZARD_M3_1_AT_3_COUNT)]):
        add(hole_wizard_m3_1, mode=Mode.SUBTRACT)

    # M3 十字槽沉头木螺钉的锥形沉头孔1 at 4: M3 十字槽沉头木螺钉的锥形沉头孔1 ×2
    with Locations(*[(i * HOLE_WIZARD_M3_1_AT_4_PITCH, 0, 0) for i in range(1, HOLE_WIZARD_M3_1_AT_4_COUNT)]):
        add(hole_wizard_m3_1, mode=Mode.SUBTRACT)


solid = Compound([part.part, body_2.part])
